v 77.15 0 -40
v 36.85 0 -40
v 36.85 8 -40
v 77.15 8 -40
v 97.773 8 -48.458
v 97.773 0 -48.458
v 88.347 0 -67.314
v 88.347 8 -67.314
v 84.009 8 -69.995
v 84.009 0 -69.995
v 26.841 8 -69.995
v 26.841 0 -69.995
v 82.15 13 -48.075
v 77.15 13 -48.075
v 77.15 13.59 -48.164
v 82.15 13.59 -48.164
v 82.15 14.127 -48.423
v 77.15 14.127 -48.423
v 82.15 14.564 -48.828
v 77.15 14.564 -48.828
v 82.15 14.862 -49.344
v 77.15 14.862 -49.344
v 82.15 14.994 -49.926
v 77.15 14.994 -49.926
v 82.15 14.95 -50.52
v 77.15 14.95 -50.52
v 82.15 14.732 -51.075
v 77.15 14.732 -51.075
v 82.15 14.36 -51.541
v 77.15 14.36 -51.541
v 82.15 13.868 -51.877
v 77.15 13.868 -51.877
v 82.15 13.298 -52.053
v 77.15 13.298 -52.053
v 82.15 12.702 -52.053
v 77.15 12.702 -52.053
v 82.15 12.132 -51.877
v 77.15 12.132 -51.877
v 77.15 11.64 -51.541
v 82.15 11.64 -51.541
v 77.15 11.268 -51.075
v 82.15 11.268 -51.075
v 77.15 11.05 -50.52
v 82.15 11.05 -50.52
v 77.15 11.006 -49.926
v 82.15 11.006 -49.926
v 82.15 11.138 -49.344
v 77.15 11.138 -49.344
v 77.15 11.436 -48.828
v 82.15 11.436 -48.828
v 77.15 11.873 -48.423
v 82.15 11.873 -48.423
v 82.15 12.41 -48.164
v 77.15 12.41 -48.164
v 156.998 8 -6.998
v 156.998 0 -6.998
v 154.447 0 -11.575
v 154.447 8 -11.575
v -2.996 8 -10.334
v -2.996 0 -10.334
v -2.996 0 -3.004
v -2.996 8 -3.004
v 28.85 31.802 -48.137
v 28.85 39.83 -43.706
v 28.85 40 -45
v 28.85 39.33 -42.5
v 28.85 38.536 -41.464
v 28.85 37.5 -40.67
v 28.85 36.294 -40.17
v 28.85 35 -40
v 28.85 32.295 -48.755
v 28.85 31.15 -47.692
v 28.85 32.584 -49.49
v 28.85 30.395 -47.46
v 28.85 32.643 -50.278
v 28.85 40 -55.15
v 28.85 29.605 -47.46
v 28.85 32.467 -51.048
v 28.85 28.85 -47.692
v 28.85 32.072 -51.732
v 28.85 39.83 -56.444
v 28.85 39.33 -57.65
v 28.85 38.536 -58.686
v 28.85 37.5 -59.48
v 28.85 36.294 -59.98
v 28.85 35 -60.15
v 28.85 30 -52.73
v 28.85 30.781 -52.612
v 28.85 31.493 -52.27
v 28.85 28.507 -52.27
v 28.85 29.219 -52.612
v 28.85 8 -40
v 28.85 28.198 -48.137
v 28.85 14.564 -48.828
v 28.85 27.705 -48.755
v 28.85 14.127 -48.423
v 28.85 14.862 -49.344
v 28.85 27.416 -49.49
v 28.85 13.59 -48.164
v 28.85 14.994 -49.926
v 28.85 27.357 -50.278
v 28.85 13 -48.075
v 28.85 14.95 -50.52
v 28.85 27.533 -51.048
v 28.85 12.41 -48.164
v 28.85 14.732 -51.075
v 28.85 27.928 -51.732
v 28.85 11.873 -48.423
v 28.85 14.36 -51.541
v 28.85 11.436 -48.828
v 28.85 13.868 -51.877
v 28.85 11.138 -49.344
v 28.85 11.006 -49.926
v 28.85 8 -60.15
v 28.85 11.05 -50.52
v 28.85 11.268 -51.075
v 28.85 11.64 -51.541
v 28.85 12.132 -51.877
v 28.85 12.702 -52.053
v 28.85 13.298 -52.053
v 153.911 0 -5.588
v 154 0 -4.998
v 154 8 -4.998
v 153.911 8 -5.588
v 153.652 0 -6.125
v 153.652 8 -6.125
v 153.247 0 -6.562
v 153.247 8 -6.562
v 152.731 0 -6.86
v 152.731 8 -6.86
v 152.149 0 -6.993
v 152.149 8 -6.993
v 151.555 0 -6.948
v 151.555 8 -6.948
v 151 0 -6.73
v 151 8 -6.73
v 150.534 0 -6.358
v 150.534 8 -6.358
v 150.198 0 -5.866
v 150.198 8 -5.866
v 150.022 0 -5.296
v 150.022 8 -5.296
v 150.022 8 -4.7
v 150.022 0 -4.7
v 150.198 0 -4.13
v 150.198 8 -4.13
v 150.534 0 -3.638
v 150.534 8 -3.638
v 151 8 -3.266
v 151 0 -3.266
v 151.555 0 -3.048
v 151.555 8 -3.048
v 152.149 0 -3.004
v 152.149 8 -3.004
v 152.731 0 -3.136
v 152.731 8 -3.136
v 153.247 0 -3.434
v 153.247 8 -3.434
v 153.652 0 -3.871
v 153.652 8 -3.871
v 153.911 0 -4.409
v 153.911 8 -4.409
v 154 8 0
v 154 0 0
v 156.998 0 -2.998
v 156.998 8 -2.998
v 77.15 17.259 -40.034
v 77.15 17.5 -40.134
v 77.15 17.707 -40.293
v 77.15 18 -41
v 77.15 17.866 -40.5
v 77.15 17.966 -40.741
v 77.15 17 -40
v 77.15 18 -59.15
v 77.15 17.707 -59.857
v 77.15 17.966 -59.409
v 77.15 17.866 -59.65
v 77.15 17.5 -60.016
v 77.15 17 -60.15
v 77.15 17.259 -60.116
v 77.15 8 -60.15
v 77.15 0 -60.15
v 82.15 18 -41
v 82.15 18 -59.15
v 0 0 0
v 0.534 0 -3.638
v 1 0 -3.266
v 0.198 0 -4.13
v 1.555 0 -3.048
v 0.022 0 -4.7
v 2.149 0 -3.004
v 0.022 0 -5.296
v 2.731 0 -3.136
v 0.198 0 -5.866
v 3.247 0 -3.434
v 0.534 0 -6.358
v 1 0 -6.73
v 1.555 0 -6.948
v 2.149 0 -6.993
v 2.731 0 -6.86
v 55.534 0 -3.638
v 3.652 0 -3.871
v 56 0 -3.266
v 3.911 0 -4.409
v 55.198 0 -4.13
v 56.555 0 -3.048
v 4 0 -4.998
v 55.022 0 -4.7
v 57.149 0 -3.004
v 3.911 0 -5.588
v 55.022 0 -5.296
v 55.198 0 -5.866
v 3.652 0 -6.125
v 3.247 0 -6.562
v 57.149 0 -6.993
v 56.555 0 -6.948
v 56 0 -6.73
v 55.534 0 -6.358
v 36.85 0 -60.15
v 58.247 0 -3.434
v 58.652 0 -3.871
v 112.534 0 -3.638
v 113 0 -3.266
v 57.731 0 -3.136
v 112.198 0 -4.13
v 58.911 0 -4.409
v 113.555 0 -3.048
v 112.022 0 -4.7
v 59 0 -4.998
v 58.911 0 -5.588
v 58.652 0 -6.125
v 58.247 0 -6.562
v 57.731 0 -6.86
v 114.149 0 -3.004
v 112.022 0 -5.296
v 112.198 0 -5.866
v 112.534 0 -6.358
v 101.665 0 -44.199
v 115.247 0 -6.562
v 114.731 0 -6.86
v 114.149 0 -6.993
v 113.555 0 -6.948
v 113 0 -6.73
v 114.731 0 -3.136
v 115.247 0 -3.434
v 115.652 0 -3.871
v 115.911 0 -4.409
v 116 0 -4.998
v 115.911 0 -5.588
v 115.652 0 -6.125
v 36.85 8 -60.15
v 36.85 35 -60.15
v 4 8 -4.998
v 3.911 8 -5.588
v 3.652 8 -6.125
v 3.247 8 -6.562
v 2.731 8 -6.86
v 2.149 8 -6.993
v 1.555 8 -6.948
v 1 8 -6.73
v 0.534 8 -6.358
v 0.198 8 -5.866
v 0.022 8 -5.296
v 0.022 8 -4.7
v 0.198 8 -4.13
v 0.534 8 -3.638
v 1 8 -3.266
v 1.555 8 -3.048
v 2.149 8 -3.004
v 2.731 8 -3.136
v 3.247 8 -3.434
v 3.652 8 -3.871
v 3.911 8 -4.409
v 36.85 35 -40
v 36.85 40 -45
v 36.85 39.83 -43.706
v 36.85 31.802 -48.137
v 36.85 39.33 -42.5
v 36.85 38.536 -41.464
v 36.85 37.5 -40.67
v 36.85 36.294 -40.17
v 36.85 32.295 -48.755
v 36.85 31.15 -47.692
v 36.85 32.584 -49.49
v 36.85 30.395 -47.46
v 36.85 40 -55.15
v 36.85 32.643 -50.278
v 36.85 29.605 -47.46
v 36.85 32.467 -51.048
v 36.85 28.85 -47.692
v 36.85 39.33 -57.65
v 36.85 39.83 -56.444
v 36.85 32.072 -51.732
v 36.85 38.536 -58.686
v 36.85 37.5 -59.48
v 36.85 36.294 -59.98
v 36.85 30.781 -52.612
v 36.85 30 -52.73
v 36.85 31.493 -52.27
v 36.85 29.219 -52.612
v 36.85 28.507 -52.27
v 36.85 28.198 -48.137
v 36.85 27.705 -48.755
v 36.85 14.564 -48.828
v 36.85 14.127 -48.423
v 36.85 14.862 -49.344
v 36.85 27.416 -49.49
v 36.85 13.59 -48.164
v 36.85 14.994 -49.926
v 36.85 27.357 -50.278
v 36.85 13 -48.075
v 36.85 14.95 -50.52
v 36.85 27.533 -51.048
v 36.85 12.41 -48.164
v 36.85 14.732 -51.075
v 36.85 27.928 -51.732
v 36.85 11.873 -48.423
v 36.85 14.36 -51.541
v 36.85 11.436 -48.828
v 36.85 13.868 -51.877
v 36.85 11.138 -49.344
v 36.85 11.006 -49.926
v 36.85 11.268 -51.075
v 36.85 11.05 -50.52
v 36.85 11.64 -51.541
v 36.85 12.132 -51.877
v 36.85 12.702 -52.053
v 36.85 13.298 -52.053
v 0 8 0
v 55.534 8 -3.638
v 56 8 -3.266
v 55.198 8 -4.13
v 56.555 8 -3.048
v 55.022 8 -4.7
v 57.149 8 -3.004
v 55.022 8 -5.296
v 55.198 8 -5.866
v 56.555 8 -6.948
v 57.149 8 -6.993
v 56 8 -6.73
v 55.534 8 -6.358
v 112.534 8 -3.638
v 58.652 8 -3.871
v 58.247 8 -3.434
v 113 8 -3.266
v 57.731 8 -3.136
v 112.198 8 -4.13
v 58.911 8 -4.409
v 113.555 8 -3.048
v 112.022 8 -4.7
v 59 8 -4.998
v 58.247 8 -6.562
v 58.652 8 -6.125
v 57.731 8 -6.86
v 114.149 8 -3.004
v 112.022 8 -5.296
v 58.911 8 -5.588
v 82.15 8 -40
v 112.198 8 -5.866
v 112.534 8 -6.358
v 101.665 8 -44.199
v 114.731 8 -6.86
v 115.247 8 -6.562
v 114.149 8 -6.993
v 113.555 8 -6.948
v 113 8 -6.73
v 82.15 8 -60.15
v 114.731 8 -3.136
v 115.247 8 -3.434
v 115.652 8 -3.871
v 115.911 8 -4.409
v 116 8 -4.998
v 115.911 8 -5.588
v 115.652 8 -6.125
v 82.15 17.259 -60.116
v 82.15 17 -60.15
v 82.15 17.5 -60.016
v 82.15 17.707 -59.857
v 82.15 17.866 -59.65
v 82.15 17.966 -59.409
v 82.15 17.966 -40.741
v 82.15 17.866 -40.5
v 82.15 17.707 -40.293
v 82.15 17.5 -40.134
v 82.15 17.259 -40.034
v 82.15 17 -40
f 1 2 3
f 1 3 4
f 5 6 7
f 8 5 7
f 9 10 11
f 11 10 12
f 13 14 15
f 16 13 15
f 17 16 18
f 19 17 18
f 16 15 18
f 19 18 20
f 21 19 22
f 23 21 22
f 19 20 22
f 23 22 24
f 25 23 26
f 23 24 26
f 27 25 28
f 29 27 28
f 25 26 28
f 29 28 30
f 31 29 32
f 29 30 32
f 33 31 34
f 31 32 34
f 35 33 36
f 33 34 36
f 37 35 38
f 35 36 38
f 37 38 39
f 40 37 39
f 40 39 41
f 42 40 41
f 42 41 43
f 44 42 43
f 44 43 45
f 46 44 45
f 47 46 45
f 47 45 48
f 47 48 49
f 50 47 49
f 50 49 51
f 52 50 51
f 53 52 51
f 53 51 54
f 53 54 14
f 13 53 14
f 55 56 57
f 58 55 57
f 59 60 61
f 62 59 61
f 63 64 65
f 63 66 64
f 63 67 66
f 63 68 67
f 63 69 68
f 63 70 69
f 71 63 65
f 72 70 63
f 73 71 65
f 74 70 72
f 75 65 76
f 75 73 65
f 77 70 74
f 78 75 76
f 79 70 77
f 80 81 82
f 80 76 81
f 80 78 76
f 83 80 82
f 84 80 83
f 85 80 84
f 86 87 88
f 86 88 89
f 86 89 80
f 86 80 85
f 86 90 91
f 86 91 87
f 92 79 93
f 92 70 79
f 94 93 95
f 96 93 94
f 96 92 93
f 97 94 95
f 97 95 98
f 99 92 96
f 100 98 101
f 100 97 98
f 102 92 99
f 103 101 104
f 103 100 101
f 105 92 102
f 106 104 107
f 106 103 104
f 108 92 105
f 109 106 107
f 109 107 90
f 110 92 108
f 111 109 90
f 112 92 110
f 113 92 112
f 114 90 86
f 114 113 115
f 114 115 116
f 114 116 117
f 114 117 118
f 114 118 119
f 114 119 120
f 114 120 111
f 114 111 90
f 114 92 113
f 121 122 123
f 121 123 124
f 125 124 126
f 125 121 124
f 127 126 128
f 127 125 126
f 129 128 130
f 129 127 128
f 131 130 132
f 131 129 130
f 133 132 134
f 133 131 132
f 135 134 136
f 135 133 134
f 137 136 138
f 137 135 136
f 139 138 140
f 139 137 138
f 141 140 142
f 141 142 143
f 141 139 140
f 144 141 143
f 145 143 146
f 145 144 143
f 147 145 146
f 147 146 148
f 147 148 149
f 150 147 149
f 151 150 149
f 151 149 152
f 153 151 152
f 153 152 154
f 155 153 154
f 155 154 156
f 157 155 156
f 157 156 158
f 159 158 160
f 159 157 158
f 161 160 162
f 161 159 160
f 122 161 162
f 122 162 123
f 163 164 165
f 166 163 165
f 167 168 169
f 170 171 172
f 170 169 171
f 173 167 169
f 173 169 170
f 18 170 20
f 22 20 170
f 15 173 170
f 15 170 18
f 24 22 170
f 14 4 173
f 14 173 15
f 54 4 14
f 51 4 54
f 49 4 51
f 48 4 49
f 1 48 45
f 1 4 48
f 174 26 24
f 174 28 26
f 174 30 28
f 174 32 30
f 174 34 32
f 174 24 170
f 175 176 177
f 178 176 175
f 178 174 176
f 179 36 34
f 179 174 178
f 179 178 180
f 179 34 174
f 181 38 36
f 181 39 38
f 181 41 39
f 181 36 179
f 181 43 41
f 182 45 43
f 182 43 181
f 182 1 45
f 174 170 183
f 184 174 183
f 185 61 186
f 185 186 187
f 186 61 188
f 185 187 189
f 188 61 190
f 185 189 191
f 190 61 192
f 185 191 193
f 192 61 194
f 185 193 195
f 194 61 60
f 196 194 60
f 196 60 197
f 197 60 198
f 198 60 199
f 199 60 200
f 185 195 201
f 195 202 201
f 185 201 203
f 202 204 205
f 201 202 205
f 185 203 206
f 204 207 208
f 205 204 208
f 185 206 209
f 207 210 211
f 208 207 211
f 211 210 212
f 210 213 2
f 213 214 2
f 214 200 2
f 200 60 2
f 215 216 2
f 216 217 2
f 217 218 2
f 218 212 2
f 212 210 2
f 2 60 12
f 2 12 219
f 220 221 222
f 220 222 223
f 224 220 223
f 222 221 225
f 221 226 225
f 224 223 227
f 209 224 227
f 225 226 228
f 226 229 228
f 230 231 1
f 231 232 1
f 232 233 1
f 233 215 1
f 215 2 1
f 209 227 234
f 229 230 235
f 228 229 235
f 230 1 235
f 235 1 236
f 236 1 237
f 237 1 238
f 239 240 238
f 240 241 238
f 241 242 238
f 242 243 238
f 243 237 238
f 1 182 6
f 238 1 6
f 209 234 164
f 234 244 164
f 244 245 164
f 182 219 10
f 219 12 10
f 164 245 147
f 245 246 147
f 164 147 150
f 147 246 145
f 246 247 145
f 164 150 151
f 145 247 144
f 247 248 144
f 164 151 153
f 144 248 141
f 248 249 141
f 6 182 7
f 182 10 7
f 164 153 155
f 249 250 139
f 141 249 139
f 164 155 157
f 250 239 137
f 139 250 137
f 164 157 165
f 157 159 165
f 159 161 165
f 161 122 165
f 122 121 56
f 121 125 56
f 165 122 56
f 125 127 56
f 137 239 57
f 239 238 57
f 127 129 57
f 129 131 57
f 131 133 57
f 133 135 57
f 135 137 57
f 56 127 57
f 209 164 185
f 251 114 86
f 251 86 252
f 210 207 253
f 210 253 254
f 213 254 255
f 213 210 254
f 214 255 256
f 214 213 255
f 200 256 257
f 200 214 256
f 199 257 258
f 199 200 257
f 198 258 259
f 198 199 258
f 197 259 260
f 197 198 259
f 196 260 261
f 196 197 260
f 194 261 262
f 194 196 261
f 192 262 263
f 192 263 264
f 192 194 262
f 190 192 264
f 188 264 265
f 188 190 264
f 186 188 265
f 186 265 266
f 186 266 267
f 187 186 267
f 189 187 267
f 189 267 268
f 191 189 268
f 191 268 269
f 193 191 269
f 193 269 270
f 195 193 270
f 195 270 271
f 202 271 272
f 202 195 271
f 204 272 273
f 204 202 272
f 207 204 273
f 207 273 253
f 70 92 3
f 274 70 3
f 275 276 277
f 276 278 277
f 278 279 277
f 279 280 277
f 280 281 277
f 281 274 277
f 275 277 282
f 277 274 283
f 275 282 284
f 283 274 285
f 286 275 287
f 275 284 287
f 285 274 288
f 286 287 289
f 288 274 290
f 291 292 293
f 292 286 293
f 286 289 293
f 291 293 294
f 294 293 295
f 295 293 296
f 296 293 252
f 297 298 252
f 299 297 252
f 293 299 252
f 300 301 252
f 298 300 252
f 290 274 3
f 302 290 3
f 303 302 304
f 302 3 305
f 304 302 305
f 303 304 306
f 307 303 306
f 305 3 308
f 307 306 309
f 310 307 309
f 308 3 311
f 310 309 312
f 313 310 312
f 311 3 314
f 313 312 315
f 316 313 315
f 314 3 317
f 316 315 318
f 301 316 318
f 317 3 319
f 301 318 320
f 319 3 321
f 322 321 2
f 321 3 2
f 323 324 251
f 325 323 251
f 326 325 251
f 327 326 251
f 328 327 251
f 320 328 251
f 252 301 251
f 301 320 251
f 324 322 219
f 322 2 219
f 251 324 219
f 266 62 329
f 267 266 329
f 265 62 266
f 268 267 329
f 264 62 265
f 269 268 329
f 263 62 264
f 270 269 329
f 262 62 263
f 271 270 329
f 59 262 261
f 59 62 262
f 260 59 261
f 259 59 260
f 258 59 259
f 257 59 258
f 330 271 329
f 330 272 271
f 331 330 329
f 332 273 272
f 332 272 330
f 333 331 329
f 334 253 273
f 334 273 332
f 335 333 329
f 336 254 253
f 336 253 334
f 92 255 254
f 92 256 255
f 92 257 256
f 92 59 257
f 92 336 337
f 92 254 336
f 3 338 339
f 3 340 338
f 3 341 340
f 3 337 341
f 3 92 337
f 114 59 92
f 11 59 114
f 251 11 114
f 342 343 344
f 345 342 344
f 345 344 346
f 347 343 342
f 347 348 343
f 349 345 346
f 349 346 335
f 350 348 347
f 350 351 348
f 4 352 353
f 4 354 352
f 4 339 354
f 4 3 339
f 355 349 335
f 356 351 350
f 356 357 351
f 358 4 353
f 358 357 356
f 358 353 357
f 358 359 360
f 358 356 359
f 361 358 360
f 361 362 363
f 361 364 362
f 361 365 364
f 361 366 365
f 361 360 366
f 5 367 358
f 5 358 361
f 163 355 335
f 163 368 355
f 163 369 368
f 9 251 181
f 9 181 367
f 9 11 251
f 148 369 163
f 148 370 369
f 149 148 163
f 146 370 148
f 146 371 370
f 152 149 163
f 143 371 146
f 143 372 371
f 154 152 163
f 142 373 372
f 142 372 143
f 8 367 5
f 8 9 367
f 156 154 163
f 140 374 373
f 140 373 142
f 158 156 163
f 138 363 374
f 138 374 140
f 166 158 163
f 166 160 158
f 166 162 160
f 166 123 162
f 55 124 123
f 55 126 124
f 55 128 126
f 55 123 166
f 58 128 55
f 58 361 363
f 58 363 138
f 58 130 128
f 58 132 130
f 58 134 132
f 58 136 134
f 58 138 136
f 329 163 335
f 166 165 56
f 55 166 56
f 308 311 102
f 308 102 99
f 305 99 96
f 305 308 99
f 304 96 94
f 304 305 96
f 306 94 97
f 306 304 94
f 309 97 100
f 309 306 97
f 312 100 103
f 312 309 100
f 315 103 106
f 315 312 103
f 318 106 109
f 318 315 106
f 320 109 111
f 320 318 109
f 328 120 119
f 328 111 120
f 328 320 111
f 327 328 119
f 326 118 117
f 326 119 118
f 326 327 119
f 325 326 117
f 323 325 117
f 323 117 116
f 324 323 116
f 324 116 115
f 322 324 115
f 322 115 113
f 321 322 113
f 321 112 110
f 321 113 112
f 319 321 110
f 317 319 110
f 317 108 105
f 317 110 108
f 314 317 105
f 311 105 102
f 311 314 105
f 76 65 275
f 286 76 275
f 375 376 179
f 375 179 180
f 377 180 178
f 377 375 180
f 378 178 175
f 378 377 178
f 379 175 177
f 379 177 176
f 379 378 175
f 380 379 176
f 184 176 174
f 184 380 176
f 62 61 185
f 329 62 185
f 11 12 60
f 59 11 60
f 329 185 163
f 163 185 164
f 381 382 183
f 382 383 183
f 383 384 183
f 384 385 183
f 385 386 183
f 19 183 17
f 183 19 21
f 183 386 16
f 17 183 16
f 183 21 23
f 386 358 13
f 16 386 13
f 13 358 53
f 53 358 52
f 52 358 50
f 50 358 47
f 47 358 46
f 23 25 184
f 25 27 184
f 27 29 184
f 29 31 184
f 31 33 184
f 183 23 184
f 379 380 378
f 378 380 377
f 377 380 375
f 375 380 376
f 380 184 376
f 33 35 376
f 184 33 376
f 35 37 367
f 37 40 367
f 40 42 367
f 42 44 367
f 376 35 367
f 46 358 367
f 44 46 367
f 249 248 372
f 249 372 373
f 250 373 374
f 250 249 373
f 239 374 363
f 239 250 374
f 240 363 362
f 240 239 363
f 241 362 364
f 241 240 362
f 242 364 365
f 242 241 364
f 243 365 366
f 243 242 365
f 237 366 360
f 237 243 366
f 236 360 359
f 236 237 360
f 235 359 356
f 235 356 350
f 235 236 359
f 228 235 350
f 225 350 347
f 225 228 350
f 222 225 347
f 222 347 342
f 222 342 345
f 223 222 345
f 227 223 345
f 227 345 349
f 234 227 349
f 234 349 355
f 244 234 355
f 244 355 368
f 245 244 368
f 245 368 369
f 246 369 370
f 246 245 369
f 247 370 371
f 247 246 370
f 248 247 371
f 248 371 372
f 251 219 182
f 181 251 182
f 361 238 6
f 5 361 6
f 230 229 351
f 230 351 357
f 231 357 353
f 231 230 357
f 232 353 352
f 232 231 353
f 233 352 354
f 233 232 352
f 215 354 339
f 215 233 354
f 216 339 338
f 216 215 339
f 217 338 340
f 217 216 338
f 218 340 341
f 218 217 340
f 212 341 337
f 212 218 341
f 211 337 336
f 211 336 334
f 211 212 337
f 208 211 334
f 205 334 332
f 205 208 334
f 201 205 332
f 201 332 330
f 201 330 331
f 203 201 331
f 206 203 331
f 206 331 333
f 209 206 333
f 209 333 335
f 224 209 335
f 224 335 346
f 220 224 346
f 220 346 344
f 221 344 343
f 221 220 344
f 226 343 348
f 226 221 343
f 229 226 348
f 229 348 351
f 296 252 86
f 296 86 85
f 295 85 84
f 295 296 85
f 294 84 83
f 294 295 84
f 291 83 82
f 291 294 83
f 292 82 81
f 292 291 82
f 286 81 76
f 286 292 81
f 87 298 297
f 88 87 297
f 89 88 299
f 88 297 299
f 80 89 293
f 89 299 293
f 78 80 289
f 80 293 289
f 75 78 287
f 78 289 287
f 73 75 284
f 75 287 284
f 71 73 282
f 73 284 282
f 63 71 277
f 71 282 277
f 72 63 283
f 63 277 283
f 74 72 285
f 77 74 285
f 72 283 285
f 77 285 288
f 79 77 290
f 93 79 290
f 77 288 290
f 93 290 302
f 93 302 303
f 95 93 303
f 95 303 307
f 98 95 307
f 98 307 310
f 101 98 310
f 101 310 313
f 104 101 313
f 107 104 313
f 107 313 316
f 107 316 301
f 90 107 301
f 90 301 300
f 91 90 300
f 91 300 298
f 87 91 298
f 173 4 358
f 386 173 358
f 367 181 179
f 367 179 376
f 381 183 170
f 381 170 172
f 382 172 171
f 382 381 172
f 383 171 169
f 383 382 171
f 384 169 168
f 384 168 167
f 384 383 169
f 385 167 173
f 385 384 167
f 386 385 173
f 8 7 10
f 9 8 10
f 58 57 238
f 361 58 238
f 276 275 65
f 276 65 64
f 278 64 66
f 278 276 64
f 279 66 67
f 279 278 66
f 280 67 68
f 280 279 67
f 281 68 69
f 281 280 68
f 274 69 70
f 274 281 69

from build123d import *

# Parameters (mm, degrees)
CROQUIS1_R              = 2
CROQUIS1_W              = 53.3
CROQUIS1_H              = 20.15
SALIENTE_EXTRUIR1_DEPTH = 8
CROQUIS2_W              = 8
CROQUIS2_H              = 20.15
CROQUIS2_W_2            = 5
SALIENTE_EXTRUIR2_DEPTH = 8
CROQUIS2_4_W            = 5
CROQUIS2_4_H            = 20.15
SALIENTE_EXTRUIR3_DEPTH = 10
CROQUIS2_5_W            = 8
CROQUIS2_5_H            = 20.15
SALIENTE_EXTRUIR4_DEPTH = 32
CROQUIS4_R              = 2
CORTAR_EXTRUIR1_DEPTH   = 32
CORTAR_EXTRUIR2_START   = 74
CROQUIS4_2_R            = 2
CORTAR_EXTRUIR2_DEPTH   = 74
CROQUIS5_R              = 2.65
CORTAR_EXTRUIR3_DEPTH   = 35
CORTAR_EXTRUIR4_DEPTH   = 16
CORTAR_EXTRUIR5_DEPTH   = 16


with BuildPart() as part:
    # Croquis1 → Saliente-Extruir1 (new body)
    with BuildSketch(Plane(origin=(0, 0, 0), x_dir=(1, 0, 0), z_dir=(0, 1, 0))):
        Polygon((154, 0), (156.998132752, 2.998132752), (156.998132752, 6.998132752), (154.446539538, 11.574918968), (101.665094886, 44.198861104), (97.772883017, 48.458390041), (88.347282669, 67.313746258), (84.009081739, 69.99516616), (26.841381739, 69.99516616), (-2.995601596, 10.334082852), (-2.995601596, 3.004082852), (0, 0), align=None)
        with Locations((2, 4.998132752)):
            Circle(CROQUIS1_R, mode=Mode.SUBTRACT)
        with Locations((57, 4.998132752)):
            Circle(CROQUIS1_R, mode=Mode.SUBTRACT)
        with Locations((114, 4.998132752)):
            Circle(CROQUIS1_R, mode=Mode.SUBTRACT)
        with Locations((152, 4.998132752)):
            Circle(CROQUIS1_R, mode=Mode.SUBTRACT)
        with Locations((55.5, 50.075)):
            Rectangle(CROQUIS1_W, CROQUIS1_H, mode=Mode.SUBTRACT)
    extrude(amount=SALIENTE_EXTRUIR1_DEPTH)

    # Croquis2 → Saliente-Extruir2 (add)
    with BuildSketch(Plane(origin=(0, 8, 0), x_dir=(1, 0, 0), z_dir=(0, 1, 0))):
        with Locations((32.85, 50.075)):
            Rectangle(CROQUIS2_W, CROQUIS2_H)
        with Locations((79.65, 50.075)):
            Rectangle(CROQUIS2_W_2, CROQUIS2_H)
    extrude(amount=-SALIENTE_EXTRUIR2_DEPTH)

    # Croquis2<4> → Saliente-Extruir3 (add)
    with BuildSketch(Plane(origin=(0, 8, 0), x_dir=(1, 0, 0), z_dir=(0, 1, 0))):
        with Locations((79.65, 50.075)):
            Rectangle(CROQUIS2_4_W, CROQUIS2_4_H)
    extrude(amount=SALIENTE_EXTRUIR3_DEPTH)

    # Croquis2<5> → Saliente-Extruir4 (add)
    with BuildSketch(Plane(origin=(0, 8, 0), x_dir=(1, 0, 0), z_dir=(0, 1, 0))):
        with Locations((32.85, 50.075)):
            Rectangle(CROQUIS2_5_W, CROQUIS2_5_H)
    extrude(amount=SALIENTE_EXTRUIR4_DEPTH)

    # Croquis4 → Cortar-Extruir1 (cut)
    with BuildSketch(Plane.ZY.offset(-77.15)):
        with Locations((-50.075, 13)):
            Circle(CROQUIS4_R)
    extrude(amount=-CORTAR_EXTRUIR1_DEPTH, mode=Mode.SUBTRACT)

    # Croquis4<2> → Cortar-Extruir2 (cut)
    with BuildSketch(Plane.ZY.offset(-77.15).offset(CORTAR_EXTRUIR2_START)):
        with Locations((-50.075, 13)):
            Circle(CROQUIS4_2_R)
    extrude(amount=-CORTAR_EXTRUIR2_DEPTH, mode=Mode.SUBTRACT)

    # Croquis5 → Cortar-Extruir3 (cut)
    with BuildSketch(Plane(origin=(36.85, 0, 0), x_dir=(0, 0, -1), z_dir=(1, 0, 0))):
        with Locations((50.08, 30)):
            Circle(CROQUIS5_R)
    extrude(amount=-CORTAR_EXTRUIR3_DEPTH, mode=Mode.SUBTRACT)

    # Croquis6 → Cortar-Extruir4 (cut)
    with BuildSketch(Plane(origin=(82.15, 0, 0), x_dir=(0, 0, -1), z_dir=(1, 0, 0))):
        with BuildLine():
            Line((40, 17), (40, 18))
            Line((40, 18), (41, 18))
            ThreePointArc((41, 18), (40.292893219, 17.707106781), (40, 17))
        make_face()
        with BuildLine():
            Line((59.15, 18), (60.15, 18))
            Line((60.15, 18), (60.15, 17))
            ThreePointArc((60.15, 17), (59.857106781, 17.707106781), (59.15, 18))
        make_face()
    extrude(amount=-CORTAR_EXTRUIR4_DEPTH, mode=Mode.SUBTRACT)

    # Croquis7 → Cortar-Extruir5 (cut)
    with BuildSketch(Plane(origin=(36.85, 0, 0), x_dir=(0, 0, -1), z_dir=(1, 0, 0))):
        with BuildLine():
            Line((40, 35), (40, 40))
            Line((40, 40), (45, 40))
            ThreePointArc((45, 40), (41.464466094, 38.535533906), (40, 35))
        make_face()
        with BuildLine():
            Line((55.15, 40), (60.15, 40))
            Line((60.15, 40), (60.15, 35))
            ThreePointArc((60.15, 35), (58.685533906, 38.535533906), (55.15, 40))
        make_face()
    extrude(amount=-CORTAR_EXTRUIR5_DEPTH, mode=Mode.SUBTRACT)


solid = part.part
